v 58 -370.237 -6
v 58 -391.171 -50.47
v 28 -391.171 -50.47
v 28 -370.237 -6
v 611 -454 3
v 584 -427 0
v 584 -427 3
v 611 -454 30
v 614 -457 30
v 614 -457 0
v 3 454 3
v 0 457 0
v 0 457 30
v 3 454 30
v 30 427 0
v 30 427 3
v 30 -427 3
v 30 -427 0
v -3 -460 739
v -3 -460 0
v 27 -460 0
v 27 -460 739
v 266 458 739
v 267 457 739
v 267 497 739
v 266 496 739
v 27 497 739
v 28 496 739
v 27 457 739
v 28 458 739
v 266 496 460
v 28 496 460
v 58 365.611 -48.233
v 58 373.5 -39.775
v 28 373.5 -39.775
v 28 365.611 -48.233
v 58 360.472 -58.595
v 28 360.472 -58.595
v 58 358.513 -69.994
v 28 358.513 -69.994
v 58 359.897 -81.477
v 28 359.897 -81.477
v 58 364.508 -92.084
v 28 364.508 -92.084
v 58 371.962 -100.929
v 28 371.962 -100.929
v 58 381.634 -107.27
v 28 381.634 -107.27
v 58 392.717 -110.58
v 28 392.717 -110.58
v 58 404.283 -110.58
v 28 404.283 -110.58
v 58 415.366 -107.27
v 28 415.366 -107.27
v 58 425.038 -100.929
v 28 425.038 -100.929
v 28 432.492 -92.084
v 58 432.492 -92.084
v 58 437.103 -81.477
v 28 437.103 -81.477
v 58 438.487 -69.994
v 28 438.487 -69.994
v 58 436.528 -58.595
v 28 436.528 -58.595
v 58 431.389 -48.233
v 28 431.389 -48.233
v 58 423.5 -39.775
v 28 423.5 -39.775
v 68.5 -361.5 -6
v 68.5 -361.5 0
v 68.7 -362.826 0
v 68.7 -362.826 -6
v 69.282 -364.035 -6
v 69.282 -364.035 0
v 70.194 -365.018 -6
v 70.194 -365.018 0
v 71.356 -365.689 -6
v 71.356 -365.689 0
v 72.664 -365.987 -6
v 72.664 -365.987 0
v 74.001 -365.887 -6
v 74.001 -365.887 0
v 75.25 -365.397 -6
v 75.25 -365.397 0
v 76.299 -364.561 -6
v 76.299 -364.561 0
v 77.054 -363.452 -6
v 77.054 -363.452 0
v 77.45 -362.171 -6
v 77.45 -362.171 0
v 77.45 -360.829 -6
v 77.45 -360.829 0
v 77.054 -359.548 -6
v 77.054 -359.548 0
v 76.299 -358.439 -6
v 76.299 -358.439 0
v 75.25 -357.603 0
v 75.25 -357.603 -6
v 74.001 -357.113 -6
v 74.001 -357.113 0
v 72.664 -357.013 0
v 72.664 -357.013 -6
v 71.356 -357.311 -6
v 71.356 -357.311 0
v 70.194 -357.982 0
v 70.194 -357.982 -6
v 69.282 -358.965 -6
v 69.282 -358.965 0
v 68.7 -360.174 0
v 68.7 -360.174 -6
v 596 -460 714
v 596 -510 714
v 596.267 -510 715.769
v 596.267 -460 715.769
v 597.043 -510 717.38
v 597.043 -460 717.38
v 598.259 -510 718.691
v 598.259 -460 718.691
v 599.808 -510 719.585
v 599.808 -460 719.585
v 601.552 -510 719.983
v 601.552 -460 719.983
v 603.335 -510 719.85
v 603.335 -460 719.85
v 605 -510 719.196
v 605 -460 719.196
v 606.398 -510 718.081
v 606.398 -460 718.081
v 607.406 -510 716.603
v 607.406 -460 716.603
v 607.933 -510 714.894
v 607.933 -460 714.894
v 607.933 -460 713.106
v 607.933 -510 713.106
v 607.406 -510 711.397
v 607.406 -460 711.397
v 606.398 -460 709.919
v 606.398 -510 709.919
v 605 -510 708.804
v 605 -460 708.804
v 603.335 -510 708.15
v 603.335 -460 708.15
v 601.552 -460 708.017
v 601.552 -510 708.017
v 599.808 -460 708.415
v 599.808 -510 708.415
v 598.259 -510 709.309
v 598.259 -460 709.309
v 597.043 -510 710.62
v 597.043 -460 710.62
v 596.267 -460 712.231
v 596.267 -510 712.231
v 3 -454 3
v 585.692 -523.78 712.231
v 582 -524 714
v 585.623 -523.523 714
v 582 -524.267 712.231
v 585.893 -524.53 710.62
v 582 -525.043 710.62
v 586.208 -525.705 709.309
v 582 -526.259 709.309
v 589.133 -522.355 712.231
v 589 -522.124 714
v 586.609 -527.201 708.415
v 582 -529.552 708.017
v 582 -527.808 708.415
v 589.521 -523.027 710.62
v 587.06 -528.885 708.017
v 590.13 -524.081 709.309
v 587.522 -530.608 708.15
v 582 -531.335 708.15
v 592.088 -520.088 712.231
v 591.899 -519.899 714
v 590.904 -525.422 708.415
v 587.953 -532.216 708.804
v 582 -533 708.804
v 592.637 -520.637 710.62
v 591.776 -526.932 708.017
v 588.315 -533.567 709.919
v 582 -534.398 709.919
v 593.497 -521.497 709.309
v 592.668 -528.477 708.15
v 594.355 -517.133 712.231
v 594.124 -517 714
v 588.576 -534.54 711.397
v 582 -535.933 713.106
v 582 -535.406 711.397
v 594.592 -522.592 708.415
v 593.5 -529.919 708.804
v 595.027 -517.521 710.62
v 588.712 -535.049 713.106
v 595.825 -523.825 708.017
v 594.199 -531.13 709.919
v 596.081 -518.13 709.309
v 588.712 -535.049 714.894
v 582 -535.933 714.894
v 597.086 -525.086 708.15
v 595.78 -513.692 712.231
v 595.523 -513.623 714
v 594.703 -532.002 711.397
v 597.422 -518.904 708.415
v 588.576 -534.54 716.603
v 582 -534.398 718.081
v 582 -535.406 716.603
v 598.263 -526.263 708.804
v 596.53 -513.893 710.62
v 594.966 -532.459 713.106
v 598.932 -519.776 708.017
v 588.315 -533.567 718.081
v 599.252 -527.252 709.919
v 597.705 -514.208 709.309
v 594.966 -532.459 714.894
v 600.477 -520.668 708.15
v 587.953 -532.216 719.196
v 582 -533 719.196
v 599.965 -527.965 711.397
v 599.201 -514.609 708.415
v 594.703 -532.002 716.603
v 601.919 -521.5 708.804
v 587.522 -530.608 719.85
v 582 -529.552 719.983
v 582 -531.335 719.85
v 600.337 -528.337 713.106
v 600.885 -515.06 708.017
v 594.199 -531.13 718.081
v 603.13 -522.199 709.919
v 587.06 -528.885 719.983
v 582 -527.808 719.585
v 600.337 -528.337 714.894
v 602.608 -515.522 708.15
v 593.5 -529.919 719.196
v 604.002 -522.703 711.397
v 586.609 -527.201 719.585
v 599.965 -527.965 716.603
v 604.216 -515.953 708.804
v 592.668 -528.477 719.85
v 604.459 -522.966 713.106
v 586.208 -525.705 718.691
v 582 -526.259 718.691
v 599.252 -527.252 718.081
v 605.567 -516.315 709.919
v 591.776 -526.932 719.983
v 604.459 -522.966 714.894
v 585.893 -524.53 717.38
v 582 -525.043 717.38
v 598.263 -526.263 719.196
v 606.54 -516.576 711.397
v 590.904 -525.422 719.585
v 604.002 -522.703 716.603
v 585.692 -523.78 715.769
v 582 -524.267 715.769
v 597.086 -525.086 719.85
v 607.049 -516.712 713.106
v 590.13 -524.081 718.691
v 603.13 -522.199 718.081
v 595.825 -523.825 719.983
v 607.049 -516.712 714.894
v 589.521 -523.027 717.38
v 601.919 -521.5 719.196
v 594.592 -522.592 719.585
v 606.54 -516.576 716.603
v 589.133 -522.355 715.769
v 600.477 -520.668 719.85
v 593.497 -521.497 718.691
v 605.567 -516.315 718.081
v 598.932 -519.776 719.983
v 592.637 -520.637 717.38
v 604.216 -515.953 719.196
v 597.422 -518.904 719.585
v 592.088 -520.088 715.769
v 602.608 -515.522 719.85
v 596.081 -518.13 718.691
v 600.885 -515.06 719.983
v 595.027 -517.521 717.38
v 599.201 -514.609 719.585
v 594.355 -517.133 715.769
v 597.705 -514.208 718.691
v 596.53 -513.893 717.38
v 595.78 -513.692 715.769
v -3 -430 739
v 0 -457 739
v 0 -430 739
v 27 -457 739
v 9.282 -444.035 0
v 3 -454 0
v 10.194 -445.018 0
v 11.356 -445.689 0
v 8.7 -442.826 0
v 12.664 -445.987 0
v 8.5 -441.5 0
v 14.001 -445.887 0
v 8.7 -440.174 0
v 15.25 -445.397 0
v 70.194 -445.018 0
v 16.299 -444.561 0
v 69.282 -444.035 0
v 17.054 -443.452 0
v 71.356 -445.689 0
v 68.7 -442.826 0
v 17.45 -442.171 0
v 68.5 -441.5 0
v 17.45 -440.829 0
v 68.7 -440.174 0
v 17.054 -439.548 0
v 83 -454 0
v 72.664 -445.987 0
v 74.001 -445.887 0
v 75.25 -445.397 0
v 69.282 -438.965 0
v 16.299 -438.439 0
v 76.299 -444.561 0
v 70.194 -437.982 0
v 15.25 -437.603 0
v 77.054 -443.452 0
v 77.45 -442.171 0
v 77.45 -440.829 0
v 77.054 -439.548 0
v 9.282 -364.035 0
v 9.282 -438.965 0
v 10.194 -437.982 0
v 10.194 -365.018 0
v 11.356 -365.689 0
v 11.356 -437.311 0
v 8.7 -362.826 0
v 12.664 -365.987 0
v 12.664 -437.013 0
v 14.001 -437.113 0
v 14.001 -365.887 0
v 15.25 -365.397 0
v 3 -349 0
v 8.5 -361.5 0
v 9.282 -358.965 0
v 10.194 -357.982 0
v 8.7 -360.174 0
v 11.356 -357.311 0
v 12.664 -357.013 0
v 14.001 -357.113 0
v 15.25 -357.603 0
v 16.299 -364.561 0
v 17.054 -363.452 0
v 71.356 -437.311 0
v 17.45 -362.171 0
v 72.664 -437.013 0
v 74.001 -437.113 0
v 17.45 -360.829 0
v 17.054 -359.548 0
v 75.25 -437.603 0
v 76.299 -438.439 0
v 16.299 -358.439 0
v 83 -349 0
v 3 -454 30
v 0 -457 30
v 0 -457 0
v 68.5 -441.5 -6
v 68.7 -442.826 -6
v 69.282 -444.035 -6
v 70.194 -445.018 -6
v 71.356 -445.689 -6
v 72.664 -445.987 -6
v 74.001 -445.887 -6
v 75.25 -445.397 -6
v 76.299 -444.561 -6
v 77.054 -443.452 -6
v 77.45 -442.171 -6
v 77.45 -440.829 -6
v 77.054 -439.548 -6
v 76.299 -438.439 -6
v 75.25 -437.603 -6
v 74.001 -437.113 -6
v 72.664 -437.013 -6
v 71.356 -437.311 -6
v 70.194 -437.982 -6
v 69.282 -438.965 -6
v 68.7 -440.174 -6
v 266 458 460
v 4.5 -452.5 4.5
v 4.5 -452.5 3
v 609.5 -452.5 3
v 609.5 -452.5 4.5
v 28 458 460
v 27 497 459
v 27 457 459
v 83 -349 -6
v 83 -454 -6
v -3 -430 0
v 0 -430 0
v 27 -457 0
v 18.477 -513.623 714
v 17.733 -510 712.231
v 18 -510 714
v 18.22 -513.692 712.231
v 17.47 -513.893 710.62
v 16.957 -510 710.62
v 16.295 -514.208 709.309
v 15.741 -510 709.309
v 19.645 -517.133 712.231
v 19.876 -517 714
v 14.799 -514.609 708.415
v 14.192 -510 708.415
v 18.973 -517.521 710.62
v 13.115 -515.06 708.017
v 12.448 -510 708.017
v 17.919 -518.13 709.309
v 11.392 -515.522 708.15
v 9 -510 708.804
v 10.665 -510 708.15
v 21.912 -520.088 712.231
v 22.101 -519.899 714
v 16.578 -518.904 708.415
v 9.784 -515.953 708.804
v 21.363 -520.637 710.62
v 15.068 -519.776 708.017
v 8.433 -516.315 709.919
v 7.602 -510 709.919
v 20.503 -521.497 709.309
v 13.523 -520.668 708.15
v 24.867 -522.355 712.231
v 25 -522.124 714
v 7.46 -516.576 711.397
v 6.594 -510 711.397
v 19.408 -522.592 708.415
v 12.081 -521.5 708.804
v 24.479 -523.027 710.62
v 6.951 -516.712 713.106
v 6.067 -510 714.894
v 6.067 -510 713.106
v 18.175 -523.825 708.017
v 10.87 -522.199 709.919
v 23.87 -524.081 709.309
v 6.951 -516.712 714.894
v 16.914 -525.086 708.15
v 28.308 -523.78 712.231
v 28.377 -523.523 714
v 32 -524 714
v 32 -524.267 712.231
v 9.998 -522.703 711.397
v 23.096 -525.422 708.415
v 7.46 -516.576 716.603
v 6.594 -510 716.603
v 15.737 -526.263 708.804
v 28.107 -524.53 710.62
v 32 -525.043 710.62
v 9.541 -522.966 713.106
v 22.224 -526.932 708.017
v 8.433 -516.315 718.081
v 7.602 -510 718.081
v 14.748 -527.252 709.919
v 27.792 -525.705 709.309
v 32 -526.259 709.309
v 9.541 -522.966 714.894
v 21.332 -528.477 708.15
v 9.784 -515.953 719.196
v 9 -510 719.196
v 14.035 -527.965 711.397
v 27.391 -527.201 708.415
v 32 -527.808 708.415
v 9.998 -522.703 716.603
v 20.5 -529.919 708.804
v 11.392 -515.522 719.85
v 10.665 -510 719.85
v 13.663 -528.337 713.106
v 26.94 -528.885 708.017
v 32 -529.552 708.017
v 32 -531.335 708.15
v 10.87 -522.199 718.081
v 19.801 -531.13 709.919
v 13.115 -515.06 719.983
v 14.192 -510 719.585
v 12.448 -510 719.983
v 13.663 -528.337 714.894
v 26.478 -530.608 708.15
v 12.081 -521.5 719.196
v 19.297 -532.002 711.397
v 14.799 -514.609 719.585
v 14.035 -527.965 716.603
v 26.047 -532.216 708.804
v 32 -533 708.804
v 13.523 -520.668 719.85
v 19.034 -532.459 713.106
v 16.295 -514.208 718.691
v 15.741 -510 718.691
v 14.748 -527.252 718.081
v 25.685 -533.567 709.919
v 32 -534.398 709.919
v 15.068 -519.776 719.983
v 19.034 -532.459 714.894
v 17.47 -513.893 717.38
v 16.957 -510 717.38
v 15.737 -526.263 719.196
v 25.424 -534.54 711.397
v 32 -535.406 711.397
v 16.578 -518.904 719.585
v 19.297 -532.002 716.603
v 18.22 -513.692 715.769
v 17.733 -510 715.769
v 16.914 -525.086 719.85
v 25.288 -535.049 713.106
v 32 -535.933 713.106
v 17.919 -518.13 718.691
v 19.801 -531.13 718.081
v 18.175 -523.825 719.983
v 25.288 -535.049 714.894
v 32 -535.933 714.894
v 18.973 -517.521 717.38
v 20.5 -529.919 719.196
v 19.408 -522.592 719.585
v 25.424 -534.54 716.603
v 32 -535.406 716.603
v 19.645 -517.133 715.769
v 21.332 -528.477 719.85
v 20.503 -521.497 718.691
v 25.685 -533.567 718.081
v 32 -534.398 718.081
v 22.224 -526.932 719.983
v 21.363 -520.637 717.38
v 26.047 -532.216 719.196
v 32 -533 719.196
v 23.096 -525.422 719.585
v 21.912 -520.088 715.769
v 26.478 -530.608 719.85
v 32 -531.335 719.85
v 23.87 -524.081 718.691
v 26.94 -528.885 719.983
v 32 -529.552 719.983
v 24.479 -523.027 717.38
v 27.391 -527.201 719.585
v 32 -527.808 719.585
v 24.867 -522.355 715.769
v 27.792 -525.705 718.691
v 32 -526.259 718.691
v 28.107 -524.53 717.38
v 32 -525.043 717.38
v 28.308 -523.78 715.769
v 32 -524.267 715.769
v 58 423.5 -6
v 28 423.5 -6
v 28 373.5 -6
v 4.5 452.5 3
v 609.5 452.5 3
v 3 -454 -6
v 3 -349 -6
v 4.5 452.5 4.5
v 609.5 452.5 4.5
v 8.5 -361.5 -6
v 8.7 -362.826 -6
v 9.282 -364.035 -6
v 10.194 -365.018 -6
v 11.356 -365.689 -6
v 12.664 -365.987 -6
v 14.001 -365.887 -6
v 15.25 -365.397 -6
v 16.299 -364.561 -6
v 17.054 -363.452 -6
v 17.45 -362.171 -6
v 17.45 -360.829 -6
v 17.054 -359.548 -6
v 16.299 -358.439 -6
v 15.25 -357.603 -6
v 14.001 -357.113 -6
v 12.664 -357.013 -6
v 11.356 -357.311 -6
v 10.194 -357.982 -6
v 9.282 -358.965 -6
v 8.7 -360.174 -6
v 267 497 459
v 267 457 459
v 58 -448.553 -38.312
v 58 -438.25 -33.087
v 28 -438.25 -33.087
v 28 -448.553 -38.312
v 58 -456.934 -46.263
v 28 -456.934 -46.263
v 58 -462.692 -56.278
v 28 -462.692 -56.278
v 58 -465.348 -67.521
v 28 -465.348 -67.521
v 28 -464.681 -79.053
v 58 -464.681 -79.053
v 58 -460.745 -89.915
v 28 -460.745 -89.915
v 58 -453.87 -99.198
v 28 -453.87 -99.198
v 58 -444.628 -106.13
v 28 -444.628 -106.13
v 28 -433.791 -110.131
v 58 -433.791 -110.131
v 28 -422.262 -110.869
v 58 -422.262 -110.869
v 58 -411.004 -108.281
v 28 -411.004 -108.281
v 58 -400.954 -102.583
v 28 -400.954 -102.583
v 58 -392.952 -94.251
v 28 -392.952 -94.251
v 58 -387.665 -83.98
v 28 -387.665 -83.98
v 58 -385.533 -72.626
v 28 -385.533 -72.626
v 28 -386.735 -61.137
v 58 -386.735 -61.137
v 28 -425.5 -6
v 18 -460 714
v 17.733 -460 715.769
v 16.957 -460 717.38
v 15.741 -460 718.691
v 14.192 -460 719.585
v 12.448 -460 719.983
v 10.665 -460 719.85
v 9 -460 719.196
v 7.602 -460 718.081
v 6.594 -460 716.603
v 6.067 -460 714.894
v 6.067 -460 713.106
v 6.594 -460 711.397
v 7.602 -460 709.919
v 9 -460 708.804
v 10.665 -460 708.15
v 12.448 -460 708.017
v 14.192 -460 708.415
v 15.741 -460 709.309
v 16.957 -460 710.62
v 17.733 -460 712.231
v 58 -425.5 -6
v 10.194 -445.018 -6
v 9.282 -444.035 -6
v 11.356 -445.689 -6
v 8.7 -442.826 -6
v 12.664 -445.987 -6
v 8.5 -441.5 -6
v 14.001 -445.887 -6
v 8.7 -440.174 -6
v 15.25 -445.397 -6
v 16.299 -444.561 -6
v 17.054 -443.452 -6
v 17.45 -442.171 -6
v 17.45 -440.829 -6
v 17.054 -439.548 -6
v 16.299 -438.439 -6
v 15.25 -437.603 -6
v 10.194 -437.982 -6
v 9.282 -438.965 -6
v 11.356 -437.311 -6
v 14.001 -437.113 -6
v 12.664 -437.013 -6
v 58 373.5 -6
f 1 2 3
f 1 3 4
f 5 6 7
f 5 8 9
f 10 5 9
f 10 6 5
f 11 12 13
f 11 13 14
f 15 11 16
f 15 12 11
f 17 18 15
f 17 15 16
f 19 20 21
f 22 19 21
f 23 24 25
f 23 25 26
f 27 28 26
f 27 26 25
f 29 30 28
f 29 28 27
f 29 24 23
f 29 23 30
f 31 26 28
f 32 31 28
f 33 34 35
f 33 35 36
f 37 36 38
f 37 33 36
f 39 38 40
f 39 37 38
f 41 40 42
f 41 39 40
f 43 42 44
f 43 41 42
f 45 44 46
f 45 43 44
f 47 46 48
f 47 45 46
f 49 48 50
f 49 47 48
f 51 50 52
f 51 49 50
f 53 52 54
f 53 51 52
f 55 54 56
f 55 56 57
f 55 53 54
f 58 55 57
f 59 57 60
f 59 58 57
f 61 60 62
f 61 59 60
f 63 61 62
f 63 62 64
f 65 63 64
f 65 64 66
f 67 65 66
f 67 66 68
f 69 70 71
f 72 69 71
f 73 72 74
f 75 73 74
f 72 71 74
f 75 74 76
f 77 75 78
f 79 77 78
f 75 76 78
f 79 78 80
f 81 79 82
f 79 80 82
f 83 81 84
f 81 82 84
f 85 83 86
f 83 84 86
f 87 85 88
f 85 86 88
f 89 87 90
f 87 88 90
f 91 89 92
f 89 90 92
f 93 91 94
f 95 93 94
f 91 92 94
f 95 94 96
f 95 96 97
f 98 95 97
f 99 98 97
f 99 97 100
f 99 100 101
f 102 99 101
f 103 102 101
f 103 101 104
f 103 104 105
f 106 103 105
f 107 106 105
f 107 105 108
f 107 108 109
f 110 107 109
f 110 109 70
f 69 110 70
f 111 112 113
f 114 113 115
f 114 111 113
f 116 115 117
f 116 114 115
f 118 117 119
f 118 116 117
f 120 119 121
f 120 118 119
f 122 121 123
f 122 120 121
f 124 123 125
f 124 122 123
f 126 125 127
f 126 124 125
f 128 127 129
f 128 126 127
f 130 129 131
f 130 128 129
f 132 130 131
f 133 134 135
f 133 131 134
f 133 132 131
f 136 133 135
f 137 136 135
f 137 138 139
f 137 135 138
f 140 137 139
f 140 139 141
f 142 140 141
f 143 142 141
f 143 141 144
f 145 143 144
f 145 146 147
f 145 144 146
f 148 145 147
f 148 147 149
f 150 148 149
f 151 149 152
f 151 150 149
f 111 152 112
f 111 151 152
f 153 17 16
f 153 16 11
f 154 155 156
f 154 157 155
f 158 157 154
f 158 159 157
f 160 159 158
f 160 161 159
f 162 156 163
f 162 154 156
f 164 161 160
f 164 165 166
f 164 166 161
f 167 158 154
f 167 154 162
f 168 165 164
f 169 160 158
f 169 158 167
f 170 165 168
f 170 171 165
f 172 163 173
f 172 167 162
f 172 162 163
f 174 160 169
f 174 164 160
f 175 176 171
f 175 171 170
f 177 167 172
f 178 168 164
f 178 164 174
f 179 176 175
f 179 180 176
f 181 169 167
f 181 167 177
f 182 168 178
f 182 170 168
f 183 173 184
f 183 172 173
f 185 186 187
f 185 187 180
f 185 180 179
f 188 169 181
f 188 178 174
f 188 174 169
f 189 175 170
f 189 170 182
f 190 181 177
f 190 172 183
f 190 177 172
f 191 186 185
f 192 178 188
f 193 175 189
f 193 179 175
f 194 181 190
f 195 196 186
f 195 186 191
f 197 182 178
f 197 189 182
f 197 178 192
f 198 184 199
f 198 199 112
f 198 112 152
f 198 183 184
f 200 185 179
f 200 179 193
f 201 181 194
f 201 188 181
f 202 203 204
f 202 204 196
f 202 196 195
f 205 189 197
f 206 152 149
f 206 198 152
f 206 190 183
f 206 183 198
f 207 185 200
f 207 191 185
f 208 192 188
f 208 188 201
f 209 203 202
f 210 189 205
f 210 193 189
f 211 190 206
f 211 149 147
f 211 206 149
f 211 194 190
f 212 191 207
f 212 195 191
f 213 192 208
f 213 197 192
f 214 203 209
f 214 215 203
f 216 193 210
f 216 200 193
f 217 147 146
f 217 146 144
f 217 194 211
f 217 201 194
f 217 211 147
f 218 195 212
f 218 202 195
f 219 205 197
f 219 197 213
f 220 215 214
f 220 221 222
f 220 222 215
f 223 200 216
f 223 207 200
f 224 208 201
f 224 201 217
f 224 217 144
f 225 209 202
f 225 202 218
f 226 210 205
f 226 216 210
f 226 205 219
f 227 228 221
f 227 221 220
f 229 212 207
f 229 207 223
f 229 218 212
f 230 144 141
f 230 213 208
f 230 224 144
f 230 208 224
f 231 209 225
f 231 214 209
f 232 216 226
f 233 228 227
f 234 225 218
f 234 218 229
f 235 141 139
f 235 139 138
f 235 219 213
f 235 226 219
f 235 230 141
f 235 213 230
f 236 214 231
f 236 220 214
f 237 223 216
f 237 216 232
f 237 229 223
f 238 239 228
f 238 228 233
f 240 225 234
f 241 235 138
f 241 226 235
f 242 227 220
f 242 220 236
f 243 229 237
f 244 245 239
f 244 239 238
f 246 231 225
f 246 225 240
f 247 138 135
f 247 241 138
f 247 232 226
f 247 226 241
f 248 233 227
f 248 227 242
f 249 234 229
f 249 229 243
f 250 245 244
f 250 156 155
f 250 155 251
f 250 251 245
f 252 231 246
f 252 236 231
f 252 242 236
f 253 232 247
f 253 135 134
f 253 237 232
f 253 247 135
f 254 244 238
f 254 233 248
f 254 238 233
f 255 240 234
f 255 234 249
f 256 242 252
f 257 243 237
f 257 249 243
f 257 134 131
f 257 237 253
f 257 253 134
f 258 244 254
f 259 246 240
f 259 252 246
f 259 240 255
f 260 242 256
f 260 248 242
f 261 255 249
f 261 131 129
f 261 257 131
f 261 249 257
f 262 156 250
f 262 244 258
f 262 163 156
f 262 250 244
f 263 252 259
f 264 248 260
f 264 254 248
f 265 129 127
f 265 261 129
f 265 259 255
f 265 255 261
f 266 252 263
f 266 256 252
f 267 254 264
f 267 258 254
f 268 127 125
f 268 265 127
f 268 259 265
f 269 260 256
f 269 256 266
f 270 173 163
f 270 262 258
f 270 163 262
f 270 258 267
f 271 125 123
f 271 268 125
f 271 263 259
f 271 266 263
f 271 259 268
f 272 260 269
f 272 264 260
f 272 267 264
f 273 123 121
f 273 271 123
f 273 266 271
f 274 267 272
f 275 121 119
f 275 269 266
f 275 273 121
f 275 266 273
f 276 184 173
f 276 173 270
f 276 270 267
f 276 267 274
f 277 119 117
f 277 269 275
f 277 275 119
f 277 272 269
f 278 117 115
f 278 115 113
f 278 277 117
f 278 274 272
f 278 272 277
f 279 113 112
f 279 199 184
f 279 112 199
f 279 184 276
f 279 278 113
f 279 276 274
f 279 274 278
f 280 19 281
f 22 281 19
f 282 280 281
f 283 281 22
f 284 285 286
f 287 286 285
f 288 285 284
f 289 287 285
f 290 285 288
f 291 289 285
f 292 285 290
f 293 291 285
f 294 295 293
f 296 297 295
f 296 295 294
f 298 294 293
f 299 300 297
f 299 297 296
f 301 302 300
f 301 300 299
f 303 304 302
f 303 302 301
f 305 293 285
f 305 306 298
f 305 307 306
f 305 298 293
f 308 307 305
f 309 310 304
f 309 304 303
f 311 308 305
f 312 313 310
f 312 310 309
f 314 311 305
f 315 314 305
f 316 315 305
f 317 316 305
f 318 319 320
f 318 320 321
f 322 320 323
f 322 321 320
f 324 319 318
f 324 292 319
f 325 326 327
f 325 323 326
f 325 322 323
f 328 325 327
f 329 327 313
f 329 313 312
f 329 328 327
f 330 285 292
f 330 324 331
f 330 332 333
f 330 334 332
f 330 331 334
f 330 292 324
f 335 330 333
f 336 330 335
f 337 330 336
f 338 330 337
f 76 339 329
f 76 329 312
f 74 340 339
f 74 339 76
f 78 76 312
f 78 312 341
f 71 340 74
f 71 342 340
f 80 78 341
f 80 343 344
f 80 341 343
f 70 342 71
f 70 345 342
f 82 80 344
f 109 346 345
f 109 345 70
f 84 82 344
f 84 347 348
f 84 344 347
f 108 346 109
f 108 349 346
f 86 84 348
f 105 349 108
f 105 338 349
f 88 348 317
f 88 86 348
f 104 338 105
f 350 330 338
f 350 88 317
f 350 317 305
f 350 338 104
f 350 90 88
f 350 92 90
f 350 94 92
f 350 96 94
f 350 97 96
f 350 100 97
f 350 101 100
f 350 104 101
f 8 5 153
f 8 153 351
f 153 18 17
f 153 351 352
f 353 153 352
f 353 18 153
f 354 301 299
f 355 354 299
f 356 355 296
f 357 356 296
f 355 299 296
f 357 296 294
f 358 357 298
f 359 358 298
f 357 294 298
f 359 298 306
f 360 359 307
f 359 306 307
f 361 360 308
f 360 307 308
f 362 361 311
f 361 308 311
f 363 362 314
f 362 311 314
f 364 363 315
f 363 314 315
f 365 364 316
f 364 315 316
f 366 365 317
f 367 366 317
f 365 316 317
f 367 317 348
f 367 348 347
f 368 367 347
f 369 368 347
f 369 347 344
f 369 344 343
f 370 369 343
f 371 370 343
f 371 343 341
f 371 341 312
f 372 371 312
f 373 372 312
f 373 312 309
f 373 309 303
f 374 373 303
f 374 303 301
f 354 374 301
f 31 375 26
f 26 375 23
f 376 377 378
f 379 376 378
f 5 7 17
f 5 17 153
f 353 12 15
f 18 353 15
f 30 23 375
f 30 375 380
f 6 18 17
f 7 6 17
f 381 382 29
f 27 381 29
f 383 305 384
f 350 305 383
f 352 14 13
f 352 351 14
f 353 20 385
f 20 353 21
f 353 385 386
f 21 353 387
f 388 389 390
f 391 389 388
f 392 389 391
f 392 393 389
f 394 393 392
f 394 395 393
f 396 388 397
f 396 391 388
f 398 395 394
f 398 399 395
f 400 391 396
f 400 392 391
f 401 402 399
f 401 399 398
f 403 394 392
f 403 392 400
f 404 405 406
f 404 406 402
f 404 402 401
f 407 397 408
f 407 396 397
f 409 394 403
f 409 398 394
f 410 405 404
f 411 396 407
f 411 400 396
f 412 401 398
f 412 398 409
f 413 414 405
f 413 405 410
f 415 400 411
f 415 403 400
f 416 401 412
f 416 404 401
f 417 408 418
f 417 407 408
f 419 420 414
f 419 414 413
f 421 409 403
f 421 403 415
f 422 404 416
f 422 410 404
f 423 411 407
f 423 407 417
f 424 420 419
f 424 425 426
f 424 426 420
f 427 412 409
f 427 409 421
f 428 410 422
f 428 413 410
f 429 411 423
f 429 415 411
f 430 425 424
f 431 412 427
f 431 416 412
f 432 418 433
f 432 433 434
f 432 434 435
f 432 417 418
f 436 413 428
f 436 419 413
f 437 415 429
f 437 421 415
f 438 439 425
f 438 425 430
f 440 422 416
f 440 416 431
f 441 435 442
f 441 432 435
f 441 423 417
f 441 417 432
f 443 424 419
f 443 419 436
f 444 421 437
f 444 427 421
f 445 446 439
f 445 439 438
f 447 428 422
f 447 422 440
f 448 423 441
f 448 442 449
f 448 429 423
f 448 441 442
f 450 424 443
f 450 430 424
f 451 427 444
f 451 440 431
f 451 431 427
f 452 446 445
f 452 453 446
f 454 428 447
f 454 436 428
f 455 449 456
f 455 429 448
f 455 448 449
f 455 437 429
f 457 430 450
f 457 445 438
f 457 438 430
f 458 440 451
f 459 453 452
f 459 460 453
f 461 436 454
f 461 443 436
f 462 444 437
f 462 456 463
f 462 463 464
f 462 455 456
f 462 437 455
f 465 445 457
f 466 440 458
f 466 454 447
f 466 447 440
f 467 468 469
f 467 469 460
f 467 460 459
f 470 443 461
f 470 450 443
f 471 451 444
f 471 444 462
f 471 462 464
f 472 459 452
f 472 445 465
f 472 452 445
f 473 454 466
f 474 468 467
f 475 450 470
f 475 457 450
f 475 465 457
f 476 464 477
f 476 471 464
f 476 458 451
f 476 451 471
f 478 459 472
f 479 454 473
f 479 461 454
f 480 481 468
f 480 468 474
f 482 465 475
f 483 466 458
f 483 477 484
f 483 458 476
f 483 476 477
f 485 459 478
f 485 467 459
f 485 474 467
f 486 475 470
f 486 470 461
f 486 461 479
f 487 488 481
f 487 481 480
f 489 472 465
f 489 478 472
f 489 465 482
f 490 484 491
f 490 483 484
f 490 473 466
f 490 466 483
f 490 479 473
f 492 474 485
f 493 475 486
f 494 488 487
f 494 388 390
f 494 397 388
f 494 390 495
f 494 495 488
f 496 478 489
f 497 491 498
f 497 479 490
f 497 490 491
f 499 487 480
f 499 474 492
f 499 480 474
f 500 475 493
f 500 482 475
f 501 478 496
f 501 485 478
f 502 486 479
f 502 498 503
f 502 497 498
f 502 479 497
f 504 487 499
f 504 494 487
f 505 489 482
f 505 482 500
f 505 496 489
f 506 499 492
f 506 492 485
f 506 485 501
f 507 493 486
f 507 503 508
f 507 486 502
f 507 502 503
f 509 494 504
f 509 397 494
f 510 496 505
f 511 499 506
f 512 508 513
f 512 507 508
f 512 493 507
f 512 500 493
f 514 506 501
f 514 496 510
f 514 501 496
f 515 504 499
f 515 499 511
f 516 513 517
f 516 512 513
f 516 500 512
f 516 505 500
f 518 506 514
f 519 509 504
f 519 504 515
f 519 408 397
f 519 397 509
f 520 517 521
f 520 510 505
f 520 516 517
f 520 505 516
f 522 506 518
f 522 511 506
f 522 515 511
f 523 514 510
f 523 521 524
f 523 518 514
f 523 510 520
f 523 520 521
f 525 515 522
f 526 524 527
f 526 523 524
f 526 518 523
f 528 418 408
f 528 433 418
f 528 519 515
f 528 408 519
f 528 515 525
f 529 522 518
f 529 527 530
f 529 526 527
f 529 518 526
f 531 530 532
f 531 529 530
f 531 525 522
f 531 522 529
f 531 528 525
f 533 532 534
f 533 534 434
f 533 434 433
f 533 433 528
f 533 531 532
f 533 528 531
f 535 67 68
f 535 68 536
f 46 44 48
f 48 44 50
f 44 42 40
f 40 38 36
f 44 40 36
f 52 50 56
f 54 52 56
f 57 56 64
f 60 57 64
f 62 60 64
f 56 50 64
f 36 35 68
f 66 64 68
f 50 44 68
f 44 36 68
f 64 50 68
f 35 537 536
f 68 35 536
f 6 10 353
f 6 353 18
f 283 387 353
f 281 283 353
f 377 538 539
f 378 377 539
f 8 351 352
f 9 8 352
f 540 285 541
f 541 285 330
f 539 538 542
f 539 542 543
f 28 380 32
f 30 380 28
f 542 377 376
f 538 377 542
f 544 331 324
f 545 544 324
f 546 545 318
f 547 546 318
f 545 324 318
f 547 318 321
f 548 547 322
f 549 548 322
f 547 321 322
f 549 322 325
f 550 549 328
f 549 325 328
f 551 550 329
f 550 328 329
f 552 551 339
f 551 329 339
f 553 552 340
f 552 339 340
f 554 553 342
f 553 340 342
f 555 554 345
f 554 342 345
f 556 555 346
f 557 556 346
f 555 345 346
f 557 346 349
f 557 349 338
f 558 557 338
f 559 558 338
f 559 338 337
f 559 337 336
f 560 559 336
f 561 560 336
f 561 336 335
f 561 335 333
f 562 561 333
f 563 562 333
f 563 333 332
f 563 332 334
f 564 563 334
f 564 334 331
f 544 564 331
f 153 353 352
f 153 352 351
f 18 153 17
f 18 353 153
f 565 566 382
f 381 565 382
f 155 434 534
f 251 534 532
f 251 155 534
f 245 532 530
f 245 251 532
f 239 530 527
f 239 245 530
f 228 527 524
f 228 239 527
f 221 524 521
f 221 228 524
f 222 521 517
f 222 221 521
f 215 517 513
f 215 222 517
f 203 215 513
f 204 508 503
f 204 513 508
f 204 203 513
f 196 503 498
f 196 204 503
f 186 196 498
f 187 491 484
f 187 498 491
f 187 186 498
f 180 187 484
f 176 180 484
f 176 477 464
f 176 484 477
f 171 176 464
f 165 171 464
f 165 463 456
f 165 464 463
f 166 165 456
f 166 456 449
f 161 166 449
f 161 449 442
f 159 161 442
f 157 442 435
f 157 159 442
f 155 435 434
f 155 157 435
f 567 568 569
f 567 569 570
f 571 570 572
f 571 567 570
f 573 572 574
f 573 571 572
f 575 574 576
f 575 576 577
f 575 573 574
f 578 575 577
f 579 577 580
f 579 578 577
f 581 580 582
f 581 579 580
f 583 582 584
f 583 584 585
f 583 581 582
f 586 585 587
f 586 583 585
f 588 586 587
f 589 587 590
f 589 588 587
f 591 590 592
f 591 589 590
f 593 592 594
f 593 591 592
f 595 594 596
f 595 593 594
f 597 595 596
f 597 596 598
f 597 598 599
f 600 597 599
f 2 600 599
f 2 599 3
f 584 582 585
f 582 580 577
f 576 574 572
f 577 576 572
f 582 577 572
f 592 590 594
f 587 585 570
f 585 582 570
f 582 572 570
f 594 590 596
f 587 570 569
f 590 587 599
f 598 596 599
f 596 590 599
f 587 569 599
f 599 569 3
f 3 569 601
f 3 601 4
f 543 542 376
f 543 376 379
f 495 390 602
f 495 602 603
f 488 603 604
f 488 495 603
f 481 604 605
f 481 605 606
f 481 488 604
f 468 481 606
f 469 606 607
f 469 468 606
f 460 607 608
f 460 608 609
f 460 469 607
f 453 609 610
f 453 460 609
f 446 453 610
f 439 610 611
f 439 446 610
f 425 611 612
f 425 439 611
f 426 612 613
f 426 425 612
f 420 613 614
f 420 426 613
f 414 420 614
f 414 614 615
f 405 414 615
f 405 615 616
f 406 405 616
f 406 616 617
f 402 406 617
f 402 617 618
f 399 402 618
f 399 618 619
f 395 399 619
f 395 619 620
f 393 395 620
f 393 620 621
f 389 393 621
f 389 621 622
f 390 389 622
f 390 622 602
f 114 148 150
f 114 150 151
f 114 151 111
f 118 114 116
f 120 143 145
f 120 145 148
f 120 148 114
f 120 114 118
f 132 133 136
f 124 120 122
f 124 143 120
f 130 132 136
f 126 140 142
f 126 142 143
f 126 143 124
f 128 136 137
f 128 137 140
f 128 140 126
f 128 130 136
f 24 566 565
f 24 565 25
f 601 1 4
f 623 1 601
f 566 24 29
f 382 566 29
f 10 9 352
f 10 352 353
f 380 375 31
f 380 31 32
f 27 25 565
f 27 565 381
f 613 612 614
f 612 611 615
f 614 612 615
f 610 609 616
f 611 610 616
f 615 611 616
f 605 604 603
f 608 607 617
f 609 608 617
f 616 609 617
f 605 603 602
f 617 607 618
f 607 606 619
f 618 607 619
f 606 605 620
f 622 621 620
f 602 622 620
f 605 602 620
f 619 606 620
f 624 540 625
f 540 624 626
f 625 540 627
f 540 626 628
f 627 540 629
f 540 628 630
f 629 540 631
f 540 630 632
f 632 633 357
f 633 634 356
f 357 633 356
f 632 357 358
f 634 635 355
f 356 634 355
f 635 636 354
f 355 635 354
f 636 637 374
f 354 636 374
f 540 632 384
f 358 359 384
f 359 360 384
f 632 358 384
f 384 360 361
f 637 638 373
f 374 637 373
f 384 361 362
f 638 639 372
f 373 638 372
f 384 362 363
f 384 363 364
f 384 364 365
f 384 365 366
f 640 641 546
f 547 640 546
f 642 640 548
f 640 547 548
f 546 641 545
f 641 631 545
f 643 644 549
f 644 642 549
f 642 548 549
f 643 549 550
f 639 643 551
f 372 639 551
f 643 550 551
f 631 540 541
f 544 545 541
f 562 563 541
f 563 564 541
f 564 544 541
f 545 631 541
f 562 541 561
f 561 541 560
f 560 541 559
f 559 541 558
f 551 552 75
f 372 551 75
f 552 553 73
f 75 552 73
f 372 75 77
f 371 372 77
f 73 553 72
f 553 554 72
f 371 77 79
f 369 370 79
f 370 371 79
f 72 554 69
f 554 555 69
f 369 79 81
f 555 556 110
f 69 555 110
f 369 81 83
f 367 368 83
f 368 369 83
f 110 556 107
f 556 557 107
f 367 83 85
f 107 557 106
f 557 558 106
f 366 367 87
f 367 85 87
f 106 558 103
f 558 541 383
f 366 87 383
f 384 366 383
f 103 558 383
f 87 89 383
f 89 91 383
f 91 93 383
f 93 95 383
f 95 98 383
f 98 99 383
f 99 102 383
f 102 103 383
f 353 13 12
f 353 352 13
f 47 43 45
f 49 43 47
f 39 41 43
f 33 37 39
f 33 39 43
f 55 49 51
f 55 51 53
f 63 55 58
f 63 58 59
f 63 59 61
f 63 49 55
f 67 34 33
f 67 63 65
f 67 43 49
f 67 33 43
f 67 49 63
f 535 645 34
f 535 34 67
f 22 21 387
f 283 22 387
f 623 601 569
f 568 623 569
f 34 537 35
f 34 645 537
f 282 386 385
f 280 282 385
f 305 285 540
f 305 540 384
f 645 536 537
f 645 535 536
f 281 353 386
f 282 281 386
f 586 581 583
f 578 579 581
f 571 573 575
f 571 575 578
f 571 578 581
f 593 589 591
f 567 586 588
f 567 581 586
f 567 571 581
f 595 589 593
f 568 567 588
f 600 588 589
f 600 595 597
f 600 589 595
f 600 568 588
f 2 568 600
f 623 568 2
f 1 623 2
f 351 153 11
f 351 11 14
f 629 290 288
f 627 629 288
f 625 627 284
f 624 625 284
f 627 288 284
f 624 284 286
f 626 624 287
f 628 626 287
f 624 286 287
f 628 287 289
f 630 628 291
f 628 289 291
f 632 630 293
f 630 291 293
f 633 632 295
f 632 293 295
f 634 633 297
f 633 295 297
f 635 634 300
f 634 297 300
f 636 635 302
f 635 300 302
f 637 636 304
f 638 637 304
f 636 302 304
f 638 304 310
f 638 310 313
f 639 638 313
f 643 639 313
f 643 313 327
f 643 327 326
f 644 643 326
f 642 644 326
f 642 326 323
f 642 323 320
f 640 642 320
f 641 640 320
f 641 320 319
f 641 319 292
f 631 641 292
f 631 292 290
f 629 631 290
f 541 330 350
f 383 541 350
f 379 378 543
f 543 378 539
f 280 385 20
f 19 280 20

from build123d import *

# Parameters (mm, degrees)
F7_DEPTH  = 457
F9_DEPTH  = 30
F11_DEPTH = 614
F13_DEPTH = 30
F15_DEPTH = 739
F16_W     = 80
F16_H     = 105
F17_DEPTH = 6
F19_D     = 9
F22_R     = 6
F25_W     = 240
F25_H     = 280
F26_DEPTH = 40
F27_T     = -1
F29_W     = 605
F29_H     = 905
F30_DEPTH = 1.5
F35_DEPTH = 15
F37_DEPTH = 15


with BuildPart() as f7:
    # F6 (on Front) → F7 (new body, symmetric)
    with BuildSketch(Plane.XZ):
        with BuildLine():
            ThreePointArc((5, 0), (1.4644660941, 1.4644660941), (0, 5))
            Line((0, 5), (0, 0))
            Line((0, 0), (5, 0))
        make_face()
        with BuildLine():
            Line((0, 30), (0, 5))
            ThreePointArc((0, 5), (1.4644660941, 1.4644660941), (5, 0))
            Line((5, 0), (30, 0))
            Line((30, 0), (30, 3))
            Line((30, 3), (5, 3))
            Line((5, 3), (3, 3))
            Line((3, 3), (3, 5))
            Line((3, 5), (3, 30))
            Line((3, 30), (0, 30))
        make_face()
    extrude(amount=F7_DEPTH, both=True)

    # F8 (on Top) → F9 (cut, through all)
    with BuildSketch(Plane.XY):
        Polygon((30, -427), (0, -457), (30, -457), align=None)
        Polygon((0, 457), (30, 427), (30, 457), align=None)
    extrude(amount=F9_DEPTH, mode=Mode.SUBTRACT)


with BuildPart() as f11:
    # F10 (on Right) → F11 (new body)
    with BuildSketch(Plane.YZ):
        with BuildLine():
            ThreePointArc((-452, 0), (-455.5355339059, 1.4644660941), (-457, 5))
            Line((-457, 5), (-457, 0))
            Line((-457, 0), (-452, 0))
        make_face()
        with BuildLine():
            Line((-457, 30), (-457, 5))
            ThreePointArc((-457, 5), (-455.5355339059, 1.4644660941), (-452, 0))
            Line((-452, 0), (-427, 0))
            Line((-427, 0), (-427, 3))
            Line((-427, 3), (-452, 3))
            Line((-452, 3), (-454, 3))
            Line((-454, 3), (-454, 5))
            Line((-454, 5), (-454, 30))
            Line((-454, 30), (-457, 30))
        make_face()
    extrude(amount=F11_DEPTH)

    # F12 (on Top) → F13 (cut, through all)
    with BuildSketch(Plane.XY):
        Polygon((0, -457), (30, -427), (0, -427), align=None)
        Polygon((614, -427), (584, -427), (614, -457), align=None)
    extrude(amount=F13_DEPTH, mode=Mode.SUBTRACT)


with BuildPart() as f15:
    # F14 (on Top) → F15 (new body)
    with BuildSketch(Plane.XY):
        with BuildLine():
            ThreePointArc((2, -460), (-1.5355339059, -458.5355339059), (-3, -455))
            Line((-3, -455), (-3, -460))
            Line((-3, -460), (2, -460))
        make_face()
        with BuildLine():
            Line((-3, -430), (-3, -455))
            ThreePointArc((-3, -455), (-1.5355339059, -458.5355339059), (2, -460))
            Line((2, -460), (27, -460))
            Line((27, -460), (27, -457))
            Line((27, -457), (2, -457))
            Line((2, -457), (0, -457))
            Line((0, -457), (0, -455))
            Line((0, -455), (0, -430))
            Line((0, -430), (-3, -430))
        make_face()
    extrude(amount=F15_DEPTH)


with BuildPart() as f17:
    # F16 (on Top) → F17 (new body)
    with BuildSketch(Plane.XY):
        with Locations((43, -401.5)):
            Rectangle(F16_W, F16_H)
    extrude(amount=-F17_DEPTH)

    # F19 (through all)
    with Locations(Plane(origin=(0, 0, -6), x_dir=(1, 0, 0), z_dir=(0, 0, -1))):
        with Locations((13, 441.5), (73, 441.5), (73, 361.5), (13, 361.5)):
            Hole(F19_D / 2)


with BuildPart() as f23:
    # F23: sweep along a path in F21
    with BuildLine(Plane.XY.offset(714)) as f23_path:
        Line((12, -460), (12, -510))
        ThreePointArc((12, -510), (17.8578643763, -524.1421356237), (32, -530))
        Line((32, -530), (582, -530))
        ThreePointArc((582, -530), (596.1421356237, -524.1421356237), (602, -510))
        Line((602, -510), (602, -460))
    # F22 (on face) → F23 (sweep)
    with BuildSketch(Plane.XZ.offset(460)):
        with Locations((12, 714)):
            Circle(F22_R)
    sweep(path=f23_path.line)


with BuildPart() as f26:
    # F25 (on face) → F26 (new body)
    with BuildSketch(Plane(origin=(0, 457, 0), x_dir=(-1, 0, 0), z_dir=(0, 1, 0))):
        with Locations((-147, 599)):
            Rectangle(F25_W, F25_H)
    extrude(amount=F26_DEPTH)

    # F27
    f27_openings = [f26.faces().sort_by_distance(p)[0] for p in [
        (147, 477, 739),
    ]]
    offset(amount=F27_T, openings=f27_openings)


with BuildPart() as f30:
    # F29 (on face) → F30 (new body)
    with BuildSketch(Plane.XY.offset(3)):
        with Locations((307, 0)):
            Rectangle(F29_W, F29_H)
    extrude(amount=F30_DEPTH)


with BuildPart() as f35:
    # F34 (on mid) → F35 (new body, symmetric)
    with BuildSketch(Plane.YZ.offset(43)):
        with BuildLine():
            Line((373.5, -6), (373.5, -39.775010008))
            ThreePointArc((373.5, -39.775010008), (398.5, -111), (423.5, -39.775010008))
            Line((423.5, -39.775010008), (423.5, -6))
            Line((423.5, -6), (373.5, -6))
        make_face()
    extrude(amount=F35_DEPTH, both=True)


with BuildPart() as f37:
    # F36 (on mid) → F37 (new body, symmetric)
    with BuildSketch(Plane.YZ.offset(43)):
        with BuildLine():
            Line((-425.5, -6), (-438.2503401227, -33.0865613963))
            ThreePointArc((-438.2503401227, -33.0865613963), (-439.3549633104, -108.5238589656), (-391.1705020722, -50.4698862149))
            Line((-391.1705020722, -50.4698862149), (-370.2373844955, -6))
            Line((-370.2373844955, -6), (-425.5, -6))
        make_face()
    extrude(amount=F37_DEPTH, both=True)


solid = Compound([f7.part, f11.part, f15.part, f17.part, f23.part, f26.part, f30.part, f35.part, f37.part])
